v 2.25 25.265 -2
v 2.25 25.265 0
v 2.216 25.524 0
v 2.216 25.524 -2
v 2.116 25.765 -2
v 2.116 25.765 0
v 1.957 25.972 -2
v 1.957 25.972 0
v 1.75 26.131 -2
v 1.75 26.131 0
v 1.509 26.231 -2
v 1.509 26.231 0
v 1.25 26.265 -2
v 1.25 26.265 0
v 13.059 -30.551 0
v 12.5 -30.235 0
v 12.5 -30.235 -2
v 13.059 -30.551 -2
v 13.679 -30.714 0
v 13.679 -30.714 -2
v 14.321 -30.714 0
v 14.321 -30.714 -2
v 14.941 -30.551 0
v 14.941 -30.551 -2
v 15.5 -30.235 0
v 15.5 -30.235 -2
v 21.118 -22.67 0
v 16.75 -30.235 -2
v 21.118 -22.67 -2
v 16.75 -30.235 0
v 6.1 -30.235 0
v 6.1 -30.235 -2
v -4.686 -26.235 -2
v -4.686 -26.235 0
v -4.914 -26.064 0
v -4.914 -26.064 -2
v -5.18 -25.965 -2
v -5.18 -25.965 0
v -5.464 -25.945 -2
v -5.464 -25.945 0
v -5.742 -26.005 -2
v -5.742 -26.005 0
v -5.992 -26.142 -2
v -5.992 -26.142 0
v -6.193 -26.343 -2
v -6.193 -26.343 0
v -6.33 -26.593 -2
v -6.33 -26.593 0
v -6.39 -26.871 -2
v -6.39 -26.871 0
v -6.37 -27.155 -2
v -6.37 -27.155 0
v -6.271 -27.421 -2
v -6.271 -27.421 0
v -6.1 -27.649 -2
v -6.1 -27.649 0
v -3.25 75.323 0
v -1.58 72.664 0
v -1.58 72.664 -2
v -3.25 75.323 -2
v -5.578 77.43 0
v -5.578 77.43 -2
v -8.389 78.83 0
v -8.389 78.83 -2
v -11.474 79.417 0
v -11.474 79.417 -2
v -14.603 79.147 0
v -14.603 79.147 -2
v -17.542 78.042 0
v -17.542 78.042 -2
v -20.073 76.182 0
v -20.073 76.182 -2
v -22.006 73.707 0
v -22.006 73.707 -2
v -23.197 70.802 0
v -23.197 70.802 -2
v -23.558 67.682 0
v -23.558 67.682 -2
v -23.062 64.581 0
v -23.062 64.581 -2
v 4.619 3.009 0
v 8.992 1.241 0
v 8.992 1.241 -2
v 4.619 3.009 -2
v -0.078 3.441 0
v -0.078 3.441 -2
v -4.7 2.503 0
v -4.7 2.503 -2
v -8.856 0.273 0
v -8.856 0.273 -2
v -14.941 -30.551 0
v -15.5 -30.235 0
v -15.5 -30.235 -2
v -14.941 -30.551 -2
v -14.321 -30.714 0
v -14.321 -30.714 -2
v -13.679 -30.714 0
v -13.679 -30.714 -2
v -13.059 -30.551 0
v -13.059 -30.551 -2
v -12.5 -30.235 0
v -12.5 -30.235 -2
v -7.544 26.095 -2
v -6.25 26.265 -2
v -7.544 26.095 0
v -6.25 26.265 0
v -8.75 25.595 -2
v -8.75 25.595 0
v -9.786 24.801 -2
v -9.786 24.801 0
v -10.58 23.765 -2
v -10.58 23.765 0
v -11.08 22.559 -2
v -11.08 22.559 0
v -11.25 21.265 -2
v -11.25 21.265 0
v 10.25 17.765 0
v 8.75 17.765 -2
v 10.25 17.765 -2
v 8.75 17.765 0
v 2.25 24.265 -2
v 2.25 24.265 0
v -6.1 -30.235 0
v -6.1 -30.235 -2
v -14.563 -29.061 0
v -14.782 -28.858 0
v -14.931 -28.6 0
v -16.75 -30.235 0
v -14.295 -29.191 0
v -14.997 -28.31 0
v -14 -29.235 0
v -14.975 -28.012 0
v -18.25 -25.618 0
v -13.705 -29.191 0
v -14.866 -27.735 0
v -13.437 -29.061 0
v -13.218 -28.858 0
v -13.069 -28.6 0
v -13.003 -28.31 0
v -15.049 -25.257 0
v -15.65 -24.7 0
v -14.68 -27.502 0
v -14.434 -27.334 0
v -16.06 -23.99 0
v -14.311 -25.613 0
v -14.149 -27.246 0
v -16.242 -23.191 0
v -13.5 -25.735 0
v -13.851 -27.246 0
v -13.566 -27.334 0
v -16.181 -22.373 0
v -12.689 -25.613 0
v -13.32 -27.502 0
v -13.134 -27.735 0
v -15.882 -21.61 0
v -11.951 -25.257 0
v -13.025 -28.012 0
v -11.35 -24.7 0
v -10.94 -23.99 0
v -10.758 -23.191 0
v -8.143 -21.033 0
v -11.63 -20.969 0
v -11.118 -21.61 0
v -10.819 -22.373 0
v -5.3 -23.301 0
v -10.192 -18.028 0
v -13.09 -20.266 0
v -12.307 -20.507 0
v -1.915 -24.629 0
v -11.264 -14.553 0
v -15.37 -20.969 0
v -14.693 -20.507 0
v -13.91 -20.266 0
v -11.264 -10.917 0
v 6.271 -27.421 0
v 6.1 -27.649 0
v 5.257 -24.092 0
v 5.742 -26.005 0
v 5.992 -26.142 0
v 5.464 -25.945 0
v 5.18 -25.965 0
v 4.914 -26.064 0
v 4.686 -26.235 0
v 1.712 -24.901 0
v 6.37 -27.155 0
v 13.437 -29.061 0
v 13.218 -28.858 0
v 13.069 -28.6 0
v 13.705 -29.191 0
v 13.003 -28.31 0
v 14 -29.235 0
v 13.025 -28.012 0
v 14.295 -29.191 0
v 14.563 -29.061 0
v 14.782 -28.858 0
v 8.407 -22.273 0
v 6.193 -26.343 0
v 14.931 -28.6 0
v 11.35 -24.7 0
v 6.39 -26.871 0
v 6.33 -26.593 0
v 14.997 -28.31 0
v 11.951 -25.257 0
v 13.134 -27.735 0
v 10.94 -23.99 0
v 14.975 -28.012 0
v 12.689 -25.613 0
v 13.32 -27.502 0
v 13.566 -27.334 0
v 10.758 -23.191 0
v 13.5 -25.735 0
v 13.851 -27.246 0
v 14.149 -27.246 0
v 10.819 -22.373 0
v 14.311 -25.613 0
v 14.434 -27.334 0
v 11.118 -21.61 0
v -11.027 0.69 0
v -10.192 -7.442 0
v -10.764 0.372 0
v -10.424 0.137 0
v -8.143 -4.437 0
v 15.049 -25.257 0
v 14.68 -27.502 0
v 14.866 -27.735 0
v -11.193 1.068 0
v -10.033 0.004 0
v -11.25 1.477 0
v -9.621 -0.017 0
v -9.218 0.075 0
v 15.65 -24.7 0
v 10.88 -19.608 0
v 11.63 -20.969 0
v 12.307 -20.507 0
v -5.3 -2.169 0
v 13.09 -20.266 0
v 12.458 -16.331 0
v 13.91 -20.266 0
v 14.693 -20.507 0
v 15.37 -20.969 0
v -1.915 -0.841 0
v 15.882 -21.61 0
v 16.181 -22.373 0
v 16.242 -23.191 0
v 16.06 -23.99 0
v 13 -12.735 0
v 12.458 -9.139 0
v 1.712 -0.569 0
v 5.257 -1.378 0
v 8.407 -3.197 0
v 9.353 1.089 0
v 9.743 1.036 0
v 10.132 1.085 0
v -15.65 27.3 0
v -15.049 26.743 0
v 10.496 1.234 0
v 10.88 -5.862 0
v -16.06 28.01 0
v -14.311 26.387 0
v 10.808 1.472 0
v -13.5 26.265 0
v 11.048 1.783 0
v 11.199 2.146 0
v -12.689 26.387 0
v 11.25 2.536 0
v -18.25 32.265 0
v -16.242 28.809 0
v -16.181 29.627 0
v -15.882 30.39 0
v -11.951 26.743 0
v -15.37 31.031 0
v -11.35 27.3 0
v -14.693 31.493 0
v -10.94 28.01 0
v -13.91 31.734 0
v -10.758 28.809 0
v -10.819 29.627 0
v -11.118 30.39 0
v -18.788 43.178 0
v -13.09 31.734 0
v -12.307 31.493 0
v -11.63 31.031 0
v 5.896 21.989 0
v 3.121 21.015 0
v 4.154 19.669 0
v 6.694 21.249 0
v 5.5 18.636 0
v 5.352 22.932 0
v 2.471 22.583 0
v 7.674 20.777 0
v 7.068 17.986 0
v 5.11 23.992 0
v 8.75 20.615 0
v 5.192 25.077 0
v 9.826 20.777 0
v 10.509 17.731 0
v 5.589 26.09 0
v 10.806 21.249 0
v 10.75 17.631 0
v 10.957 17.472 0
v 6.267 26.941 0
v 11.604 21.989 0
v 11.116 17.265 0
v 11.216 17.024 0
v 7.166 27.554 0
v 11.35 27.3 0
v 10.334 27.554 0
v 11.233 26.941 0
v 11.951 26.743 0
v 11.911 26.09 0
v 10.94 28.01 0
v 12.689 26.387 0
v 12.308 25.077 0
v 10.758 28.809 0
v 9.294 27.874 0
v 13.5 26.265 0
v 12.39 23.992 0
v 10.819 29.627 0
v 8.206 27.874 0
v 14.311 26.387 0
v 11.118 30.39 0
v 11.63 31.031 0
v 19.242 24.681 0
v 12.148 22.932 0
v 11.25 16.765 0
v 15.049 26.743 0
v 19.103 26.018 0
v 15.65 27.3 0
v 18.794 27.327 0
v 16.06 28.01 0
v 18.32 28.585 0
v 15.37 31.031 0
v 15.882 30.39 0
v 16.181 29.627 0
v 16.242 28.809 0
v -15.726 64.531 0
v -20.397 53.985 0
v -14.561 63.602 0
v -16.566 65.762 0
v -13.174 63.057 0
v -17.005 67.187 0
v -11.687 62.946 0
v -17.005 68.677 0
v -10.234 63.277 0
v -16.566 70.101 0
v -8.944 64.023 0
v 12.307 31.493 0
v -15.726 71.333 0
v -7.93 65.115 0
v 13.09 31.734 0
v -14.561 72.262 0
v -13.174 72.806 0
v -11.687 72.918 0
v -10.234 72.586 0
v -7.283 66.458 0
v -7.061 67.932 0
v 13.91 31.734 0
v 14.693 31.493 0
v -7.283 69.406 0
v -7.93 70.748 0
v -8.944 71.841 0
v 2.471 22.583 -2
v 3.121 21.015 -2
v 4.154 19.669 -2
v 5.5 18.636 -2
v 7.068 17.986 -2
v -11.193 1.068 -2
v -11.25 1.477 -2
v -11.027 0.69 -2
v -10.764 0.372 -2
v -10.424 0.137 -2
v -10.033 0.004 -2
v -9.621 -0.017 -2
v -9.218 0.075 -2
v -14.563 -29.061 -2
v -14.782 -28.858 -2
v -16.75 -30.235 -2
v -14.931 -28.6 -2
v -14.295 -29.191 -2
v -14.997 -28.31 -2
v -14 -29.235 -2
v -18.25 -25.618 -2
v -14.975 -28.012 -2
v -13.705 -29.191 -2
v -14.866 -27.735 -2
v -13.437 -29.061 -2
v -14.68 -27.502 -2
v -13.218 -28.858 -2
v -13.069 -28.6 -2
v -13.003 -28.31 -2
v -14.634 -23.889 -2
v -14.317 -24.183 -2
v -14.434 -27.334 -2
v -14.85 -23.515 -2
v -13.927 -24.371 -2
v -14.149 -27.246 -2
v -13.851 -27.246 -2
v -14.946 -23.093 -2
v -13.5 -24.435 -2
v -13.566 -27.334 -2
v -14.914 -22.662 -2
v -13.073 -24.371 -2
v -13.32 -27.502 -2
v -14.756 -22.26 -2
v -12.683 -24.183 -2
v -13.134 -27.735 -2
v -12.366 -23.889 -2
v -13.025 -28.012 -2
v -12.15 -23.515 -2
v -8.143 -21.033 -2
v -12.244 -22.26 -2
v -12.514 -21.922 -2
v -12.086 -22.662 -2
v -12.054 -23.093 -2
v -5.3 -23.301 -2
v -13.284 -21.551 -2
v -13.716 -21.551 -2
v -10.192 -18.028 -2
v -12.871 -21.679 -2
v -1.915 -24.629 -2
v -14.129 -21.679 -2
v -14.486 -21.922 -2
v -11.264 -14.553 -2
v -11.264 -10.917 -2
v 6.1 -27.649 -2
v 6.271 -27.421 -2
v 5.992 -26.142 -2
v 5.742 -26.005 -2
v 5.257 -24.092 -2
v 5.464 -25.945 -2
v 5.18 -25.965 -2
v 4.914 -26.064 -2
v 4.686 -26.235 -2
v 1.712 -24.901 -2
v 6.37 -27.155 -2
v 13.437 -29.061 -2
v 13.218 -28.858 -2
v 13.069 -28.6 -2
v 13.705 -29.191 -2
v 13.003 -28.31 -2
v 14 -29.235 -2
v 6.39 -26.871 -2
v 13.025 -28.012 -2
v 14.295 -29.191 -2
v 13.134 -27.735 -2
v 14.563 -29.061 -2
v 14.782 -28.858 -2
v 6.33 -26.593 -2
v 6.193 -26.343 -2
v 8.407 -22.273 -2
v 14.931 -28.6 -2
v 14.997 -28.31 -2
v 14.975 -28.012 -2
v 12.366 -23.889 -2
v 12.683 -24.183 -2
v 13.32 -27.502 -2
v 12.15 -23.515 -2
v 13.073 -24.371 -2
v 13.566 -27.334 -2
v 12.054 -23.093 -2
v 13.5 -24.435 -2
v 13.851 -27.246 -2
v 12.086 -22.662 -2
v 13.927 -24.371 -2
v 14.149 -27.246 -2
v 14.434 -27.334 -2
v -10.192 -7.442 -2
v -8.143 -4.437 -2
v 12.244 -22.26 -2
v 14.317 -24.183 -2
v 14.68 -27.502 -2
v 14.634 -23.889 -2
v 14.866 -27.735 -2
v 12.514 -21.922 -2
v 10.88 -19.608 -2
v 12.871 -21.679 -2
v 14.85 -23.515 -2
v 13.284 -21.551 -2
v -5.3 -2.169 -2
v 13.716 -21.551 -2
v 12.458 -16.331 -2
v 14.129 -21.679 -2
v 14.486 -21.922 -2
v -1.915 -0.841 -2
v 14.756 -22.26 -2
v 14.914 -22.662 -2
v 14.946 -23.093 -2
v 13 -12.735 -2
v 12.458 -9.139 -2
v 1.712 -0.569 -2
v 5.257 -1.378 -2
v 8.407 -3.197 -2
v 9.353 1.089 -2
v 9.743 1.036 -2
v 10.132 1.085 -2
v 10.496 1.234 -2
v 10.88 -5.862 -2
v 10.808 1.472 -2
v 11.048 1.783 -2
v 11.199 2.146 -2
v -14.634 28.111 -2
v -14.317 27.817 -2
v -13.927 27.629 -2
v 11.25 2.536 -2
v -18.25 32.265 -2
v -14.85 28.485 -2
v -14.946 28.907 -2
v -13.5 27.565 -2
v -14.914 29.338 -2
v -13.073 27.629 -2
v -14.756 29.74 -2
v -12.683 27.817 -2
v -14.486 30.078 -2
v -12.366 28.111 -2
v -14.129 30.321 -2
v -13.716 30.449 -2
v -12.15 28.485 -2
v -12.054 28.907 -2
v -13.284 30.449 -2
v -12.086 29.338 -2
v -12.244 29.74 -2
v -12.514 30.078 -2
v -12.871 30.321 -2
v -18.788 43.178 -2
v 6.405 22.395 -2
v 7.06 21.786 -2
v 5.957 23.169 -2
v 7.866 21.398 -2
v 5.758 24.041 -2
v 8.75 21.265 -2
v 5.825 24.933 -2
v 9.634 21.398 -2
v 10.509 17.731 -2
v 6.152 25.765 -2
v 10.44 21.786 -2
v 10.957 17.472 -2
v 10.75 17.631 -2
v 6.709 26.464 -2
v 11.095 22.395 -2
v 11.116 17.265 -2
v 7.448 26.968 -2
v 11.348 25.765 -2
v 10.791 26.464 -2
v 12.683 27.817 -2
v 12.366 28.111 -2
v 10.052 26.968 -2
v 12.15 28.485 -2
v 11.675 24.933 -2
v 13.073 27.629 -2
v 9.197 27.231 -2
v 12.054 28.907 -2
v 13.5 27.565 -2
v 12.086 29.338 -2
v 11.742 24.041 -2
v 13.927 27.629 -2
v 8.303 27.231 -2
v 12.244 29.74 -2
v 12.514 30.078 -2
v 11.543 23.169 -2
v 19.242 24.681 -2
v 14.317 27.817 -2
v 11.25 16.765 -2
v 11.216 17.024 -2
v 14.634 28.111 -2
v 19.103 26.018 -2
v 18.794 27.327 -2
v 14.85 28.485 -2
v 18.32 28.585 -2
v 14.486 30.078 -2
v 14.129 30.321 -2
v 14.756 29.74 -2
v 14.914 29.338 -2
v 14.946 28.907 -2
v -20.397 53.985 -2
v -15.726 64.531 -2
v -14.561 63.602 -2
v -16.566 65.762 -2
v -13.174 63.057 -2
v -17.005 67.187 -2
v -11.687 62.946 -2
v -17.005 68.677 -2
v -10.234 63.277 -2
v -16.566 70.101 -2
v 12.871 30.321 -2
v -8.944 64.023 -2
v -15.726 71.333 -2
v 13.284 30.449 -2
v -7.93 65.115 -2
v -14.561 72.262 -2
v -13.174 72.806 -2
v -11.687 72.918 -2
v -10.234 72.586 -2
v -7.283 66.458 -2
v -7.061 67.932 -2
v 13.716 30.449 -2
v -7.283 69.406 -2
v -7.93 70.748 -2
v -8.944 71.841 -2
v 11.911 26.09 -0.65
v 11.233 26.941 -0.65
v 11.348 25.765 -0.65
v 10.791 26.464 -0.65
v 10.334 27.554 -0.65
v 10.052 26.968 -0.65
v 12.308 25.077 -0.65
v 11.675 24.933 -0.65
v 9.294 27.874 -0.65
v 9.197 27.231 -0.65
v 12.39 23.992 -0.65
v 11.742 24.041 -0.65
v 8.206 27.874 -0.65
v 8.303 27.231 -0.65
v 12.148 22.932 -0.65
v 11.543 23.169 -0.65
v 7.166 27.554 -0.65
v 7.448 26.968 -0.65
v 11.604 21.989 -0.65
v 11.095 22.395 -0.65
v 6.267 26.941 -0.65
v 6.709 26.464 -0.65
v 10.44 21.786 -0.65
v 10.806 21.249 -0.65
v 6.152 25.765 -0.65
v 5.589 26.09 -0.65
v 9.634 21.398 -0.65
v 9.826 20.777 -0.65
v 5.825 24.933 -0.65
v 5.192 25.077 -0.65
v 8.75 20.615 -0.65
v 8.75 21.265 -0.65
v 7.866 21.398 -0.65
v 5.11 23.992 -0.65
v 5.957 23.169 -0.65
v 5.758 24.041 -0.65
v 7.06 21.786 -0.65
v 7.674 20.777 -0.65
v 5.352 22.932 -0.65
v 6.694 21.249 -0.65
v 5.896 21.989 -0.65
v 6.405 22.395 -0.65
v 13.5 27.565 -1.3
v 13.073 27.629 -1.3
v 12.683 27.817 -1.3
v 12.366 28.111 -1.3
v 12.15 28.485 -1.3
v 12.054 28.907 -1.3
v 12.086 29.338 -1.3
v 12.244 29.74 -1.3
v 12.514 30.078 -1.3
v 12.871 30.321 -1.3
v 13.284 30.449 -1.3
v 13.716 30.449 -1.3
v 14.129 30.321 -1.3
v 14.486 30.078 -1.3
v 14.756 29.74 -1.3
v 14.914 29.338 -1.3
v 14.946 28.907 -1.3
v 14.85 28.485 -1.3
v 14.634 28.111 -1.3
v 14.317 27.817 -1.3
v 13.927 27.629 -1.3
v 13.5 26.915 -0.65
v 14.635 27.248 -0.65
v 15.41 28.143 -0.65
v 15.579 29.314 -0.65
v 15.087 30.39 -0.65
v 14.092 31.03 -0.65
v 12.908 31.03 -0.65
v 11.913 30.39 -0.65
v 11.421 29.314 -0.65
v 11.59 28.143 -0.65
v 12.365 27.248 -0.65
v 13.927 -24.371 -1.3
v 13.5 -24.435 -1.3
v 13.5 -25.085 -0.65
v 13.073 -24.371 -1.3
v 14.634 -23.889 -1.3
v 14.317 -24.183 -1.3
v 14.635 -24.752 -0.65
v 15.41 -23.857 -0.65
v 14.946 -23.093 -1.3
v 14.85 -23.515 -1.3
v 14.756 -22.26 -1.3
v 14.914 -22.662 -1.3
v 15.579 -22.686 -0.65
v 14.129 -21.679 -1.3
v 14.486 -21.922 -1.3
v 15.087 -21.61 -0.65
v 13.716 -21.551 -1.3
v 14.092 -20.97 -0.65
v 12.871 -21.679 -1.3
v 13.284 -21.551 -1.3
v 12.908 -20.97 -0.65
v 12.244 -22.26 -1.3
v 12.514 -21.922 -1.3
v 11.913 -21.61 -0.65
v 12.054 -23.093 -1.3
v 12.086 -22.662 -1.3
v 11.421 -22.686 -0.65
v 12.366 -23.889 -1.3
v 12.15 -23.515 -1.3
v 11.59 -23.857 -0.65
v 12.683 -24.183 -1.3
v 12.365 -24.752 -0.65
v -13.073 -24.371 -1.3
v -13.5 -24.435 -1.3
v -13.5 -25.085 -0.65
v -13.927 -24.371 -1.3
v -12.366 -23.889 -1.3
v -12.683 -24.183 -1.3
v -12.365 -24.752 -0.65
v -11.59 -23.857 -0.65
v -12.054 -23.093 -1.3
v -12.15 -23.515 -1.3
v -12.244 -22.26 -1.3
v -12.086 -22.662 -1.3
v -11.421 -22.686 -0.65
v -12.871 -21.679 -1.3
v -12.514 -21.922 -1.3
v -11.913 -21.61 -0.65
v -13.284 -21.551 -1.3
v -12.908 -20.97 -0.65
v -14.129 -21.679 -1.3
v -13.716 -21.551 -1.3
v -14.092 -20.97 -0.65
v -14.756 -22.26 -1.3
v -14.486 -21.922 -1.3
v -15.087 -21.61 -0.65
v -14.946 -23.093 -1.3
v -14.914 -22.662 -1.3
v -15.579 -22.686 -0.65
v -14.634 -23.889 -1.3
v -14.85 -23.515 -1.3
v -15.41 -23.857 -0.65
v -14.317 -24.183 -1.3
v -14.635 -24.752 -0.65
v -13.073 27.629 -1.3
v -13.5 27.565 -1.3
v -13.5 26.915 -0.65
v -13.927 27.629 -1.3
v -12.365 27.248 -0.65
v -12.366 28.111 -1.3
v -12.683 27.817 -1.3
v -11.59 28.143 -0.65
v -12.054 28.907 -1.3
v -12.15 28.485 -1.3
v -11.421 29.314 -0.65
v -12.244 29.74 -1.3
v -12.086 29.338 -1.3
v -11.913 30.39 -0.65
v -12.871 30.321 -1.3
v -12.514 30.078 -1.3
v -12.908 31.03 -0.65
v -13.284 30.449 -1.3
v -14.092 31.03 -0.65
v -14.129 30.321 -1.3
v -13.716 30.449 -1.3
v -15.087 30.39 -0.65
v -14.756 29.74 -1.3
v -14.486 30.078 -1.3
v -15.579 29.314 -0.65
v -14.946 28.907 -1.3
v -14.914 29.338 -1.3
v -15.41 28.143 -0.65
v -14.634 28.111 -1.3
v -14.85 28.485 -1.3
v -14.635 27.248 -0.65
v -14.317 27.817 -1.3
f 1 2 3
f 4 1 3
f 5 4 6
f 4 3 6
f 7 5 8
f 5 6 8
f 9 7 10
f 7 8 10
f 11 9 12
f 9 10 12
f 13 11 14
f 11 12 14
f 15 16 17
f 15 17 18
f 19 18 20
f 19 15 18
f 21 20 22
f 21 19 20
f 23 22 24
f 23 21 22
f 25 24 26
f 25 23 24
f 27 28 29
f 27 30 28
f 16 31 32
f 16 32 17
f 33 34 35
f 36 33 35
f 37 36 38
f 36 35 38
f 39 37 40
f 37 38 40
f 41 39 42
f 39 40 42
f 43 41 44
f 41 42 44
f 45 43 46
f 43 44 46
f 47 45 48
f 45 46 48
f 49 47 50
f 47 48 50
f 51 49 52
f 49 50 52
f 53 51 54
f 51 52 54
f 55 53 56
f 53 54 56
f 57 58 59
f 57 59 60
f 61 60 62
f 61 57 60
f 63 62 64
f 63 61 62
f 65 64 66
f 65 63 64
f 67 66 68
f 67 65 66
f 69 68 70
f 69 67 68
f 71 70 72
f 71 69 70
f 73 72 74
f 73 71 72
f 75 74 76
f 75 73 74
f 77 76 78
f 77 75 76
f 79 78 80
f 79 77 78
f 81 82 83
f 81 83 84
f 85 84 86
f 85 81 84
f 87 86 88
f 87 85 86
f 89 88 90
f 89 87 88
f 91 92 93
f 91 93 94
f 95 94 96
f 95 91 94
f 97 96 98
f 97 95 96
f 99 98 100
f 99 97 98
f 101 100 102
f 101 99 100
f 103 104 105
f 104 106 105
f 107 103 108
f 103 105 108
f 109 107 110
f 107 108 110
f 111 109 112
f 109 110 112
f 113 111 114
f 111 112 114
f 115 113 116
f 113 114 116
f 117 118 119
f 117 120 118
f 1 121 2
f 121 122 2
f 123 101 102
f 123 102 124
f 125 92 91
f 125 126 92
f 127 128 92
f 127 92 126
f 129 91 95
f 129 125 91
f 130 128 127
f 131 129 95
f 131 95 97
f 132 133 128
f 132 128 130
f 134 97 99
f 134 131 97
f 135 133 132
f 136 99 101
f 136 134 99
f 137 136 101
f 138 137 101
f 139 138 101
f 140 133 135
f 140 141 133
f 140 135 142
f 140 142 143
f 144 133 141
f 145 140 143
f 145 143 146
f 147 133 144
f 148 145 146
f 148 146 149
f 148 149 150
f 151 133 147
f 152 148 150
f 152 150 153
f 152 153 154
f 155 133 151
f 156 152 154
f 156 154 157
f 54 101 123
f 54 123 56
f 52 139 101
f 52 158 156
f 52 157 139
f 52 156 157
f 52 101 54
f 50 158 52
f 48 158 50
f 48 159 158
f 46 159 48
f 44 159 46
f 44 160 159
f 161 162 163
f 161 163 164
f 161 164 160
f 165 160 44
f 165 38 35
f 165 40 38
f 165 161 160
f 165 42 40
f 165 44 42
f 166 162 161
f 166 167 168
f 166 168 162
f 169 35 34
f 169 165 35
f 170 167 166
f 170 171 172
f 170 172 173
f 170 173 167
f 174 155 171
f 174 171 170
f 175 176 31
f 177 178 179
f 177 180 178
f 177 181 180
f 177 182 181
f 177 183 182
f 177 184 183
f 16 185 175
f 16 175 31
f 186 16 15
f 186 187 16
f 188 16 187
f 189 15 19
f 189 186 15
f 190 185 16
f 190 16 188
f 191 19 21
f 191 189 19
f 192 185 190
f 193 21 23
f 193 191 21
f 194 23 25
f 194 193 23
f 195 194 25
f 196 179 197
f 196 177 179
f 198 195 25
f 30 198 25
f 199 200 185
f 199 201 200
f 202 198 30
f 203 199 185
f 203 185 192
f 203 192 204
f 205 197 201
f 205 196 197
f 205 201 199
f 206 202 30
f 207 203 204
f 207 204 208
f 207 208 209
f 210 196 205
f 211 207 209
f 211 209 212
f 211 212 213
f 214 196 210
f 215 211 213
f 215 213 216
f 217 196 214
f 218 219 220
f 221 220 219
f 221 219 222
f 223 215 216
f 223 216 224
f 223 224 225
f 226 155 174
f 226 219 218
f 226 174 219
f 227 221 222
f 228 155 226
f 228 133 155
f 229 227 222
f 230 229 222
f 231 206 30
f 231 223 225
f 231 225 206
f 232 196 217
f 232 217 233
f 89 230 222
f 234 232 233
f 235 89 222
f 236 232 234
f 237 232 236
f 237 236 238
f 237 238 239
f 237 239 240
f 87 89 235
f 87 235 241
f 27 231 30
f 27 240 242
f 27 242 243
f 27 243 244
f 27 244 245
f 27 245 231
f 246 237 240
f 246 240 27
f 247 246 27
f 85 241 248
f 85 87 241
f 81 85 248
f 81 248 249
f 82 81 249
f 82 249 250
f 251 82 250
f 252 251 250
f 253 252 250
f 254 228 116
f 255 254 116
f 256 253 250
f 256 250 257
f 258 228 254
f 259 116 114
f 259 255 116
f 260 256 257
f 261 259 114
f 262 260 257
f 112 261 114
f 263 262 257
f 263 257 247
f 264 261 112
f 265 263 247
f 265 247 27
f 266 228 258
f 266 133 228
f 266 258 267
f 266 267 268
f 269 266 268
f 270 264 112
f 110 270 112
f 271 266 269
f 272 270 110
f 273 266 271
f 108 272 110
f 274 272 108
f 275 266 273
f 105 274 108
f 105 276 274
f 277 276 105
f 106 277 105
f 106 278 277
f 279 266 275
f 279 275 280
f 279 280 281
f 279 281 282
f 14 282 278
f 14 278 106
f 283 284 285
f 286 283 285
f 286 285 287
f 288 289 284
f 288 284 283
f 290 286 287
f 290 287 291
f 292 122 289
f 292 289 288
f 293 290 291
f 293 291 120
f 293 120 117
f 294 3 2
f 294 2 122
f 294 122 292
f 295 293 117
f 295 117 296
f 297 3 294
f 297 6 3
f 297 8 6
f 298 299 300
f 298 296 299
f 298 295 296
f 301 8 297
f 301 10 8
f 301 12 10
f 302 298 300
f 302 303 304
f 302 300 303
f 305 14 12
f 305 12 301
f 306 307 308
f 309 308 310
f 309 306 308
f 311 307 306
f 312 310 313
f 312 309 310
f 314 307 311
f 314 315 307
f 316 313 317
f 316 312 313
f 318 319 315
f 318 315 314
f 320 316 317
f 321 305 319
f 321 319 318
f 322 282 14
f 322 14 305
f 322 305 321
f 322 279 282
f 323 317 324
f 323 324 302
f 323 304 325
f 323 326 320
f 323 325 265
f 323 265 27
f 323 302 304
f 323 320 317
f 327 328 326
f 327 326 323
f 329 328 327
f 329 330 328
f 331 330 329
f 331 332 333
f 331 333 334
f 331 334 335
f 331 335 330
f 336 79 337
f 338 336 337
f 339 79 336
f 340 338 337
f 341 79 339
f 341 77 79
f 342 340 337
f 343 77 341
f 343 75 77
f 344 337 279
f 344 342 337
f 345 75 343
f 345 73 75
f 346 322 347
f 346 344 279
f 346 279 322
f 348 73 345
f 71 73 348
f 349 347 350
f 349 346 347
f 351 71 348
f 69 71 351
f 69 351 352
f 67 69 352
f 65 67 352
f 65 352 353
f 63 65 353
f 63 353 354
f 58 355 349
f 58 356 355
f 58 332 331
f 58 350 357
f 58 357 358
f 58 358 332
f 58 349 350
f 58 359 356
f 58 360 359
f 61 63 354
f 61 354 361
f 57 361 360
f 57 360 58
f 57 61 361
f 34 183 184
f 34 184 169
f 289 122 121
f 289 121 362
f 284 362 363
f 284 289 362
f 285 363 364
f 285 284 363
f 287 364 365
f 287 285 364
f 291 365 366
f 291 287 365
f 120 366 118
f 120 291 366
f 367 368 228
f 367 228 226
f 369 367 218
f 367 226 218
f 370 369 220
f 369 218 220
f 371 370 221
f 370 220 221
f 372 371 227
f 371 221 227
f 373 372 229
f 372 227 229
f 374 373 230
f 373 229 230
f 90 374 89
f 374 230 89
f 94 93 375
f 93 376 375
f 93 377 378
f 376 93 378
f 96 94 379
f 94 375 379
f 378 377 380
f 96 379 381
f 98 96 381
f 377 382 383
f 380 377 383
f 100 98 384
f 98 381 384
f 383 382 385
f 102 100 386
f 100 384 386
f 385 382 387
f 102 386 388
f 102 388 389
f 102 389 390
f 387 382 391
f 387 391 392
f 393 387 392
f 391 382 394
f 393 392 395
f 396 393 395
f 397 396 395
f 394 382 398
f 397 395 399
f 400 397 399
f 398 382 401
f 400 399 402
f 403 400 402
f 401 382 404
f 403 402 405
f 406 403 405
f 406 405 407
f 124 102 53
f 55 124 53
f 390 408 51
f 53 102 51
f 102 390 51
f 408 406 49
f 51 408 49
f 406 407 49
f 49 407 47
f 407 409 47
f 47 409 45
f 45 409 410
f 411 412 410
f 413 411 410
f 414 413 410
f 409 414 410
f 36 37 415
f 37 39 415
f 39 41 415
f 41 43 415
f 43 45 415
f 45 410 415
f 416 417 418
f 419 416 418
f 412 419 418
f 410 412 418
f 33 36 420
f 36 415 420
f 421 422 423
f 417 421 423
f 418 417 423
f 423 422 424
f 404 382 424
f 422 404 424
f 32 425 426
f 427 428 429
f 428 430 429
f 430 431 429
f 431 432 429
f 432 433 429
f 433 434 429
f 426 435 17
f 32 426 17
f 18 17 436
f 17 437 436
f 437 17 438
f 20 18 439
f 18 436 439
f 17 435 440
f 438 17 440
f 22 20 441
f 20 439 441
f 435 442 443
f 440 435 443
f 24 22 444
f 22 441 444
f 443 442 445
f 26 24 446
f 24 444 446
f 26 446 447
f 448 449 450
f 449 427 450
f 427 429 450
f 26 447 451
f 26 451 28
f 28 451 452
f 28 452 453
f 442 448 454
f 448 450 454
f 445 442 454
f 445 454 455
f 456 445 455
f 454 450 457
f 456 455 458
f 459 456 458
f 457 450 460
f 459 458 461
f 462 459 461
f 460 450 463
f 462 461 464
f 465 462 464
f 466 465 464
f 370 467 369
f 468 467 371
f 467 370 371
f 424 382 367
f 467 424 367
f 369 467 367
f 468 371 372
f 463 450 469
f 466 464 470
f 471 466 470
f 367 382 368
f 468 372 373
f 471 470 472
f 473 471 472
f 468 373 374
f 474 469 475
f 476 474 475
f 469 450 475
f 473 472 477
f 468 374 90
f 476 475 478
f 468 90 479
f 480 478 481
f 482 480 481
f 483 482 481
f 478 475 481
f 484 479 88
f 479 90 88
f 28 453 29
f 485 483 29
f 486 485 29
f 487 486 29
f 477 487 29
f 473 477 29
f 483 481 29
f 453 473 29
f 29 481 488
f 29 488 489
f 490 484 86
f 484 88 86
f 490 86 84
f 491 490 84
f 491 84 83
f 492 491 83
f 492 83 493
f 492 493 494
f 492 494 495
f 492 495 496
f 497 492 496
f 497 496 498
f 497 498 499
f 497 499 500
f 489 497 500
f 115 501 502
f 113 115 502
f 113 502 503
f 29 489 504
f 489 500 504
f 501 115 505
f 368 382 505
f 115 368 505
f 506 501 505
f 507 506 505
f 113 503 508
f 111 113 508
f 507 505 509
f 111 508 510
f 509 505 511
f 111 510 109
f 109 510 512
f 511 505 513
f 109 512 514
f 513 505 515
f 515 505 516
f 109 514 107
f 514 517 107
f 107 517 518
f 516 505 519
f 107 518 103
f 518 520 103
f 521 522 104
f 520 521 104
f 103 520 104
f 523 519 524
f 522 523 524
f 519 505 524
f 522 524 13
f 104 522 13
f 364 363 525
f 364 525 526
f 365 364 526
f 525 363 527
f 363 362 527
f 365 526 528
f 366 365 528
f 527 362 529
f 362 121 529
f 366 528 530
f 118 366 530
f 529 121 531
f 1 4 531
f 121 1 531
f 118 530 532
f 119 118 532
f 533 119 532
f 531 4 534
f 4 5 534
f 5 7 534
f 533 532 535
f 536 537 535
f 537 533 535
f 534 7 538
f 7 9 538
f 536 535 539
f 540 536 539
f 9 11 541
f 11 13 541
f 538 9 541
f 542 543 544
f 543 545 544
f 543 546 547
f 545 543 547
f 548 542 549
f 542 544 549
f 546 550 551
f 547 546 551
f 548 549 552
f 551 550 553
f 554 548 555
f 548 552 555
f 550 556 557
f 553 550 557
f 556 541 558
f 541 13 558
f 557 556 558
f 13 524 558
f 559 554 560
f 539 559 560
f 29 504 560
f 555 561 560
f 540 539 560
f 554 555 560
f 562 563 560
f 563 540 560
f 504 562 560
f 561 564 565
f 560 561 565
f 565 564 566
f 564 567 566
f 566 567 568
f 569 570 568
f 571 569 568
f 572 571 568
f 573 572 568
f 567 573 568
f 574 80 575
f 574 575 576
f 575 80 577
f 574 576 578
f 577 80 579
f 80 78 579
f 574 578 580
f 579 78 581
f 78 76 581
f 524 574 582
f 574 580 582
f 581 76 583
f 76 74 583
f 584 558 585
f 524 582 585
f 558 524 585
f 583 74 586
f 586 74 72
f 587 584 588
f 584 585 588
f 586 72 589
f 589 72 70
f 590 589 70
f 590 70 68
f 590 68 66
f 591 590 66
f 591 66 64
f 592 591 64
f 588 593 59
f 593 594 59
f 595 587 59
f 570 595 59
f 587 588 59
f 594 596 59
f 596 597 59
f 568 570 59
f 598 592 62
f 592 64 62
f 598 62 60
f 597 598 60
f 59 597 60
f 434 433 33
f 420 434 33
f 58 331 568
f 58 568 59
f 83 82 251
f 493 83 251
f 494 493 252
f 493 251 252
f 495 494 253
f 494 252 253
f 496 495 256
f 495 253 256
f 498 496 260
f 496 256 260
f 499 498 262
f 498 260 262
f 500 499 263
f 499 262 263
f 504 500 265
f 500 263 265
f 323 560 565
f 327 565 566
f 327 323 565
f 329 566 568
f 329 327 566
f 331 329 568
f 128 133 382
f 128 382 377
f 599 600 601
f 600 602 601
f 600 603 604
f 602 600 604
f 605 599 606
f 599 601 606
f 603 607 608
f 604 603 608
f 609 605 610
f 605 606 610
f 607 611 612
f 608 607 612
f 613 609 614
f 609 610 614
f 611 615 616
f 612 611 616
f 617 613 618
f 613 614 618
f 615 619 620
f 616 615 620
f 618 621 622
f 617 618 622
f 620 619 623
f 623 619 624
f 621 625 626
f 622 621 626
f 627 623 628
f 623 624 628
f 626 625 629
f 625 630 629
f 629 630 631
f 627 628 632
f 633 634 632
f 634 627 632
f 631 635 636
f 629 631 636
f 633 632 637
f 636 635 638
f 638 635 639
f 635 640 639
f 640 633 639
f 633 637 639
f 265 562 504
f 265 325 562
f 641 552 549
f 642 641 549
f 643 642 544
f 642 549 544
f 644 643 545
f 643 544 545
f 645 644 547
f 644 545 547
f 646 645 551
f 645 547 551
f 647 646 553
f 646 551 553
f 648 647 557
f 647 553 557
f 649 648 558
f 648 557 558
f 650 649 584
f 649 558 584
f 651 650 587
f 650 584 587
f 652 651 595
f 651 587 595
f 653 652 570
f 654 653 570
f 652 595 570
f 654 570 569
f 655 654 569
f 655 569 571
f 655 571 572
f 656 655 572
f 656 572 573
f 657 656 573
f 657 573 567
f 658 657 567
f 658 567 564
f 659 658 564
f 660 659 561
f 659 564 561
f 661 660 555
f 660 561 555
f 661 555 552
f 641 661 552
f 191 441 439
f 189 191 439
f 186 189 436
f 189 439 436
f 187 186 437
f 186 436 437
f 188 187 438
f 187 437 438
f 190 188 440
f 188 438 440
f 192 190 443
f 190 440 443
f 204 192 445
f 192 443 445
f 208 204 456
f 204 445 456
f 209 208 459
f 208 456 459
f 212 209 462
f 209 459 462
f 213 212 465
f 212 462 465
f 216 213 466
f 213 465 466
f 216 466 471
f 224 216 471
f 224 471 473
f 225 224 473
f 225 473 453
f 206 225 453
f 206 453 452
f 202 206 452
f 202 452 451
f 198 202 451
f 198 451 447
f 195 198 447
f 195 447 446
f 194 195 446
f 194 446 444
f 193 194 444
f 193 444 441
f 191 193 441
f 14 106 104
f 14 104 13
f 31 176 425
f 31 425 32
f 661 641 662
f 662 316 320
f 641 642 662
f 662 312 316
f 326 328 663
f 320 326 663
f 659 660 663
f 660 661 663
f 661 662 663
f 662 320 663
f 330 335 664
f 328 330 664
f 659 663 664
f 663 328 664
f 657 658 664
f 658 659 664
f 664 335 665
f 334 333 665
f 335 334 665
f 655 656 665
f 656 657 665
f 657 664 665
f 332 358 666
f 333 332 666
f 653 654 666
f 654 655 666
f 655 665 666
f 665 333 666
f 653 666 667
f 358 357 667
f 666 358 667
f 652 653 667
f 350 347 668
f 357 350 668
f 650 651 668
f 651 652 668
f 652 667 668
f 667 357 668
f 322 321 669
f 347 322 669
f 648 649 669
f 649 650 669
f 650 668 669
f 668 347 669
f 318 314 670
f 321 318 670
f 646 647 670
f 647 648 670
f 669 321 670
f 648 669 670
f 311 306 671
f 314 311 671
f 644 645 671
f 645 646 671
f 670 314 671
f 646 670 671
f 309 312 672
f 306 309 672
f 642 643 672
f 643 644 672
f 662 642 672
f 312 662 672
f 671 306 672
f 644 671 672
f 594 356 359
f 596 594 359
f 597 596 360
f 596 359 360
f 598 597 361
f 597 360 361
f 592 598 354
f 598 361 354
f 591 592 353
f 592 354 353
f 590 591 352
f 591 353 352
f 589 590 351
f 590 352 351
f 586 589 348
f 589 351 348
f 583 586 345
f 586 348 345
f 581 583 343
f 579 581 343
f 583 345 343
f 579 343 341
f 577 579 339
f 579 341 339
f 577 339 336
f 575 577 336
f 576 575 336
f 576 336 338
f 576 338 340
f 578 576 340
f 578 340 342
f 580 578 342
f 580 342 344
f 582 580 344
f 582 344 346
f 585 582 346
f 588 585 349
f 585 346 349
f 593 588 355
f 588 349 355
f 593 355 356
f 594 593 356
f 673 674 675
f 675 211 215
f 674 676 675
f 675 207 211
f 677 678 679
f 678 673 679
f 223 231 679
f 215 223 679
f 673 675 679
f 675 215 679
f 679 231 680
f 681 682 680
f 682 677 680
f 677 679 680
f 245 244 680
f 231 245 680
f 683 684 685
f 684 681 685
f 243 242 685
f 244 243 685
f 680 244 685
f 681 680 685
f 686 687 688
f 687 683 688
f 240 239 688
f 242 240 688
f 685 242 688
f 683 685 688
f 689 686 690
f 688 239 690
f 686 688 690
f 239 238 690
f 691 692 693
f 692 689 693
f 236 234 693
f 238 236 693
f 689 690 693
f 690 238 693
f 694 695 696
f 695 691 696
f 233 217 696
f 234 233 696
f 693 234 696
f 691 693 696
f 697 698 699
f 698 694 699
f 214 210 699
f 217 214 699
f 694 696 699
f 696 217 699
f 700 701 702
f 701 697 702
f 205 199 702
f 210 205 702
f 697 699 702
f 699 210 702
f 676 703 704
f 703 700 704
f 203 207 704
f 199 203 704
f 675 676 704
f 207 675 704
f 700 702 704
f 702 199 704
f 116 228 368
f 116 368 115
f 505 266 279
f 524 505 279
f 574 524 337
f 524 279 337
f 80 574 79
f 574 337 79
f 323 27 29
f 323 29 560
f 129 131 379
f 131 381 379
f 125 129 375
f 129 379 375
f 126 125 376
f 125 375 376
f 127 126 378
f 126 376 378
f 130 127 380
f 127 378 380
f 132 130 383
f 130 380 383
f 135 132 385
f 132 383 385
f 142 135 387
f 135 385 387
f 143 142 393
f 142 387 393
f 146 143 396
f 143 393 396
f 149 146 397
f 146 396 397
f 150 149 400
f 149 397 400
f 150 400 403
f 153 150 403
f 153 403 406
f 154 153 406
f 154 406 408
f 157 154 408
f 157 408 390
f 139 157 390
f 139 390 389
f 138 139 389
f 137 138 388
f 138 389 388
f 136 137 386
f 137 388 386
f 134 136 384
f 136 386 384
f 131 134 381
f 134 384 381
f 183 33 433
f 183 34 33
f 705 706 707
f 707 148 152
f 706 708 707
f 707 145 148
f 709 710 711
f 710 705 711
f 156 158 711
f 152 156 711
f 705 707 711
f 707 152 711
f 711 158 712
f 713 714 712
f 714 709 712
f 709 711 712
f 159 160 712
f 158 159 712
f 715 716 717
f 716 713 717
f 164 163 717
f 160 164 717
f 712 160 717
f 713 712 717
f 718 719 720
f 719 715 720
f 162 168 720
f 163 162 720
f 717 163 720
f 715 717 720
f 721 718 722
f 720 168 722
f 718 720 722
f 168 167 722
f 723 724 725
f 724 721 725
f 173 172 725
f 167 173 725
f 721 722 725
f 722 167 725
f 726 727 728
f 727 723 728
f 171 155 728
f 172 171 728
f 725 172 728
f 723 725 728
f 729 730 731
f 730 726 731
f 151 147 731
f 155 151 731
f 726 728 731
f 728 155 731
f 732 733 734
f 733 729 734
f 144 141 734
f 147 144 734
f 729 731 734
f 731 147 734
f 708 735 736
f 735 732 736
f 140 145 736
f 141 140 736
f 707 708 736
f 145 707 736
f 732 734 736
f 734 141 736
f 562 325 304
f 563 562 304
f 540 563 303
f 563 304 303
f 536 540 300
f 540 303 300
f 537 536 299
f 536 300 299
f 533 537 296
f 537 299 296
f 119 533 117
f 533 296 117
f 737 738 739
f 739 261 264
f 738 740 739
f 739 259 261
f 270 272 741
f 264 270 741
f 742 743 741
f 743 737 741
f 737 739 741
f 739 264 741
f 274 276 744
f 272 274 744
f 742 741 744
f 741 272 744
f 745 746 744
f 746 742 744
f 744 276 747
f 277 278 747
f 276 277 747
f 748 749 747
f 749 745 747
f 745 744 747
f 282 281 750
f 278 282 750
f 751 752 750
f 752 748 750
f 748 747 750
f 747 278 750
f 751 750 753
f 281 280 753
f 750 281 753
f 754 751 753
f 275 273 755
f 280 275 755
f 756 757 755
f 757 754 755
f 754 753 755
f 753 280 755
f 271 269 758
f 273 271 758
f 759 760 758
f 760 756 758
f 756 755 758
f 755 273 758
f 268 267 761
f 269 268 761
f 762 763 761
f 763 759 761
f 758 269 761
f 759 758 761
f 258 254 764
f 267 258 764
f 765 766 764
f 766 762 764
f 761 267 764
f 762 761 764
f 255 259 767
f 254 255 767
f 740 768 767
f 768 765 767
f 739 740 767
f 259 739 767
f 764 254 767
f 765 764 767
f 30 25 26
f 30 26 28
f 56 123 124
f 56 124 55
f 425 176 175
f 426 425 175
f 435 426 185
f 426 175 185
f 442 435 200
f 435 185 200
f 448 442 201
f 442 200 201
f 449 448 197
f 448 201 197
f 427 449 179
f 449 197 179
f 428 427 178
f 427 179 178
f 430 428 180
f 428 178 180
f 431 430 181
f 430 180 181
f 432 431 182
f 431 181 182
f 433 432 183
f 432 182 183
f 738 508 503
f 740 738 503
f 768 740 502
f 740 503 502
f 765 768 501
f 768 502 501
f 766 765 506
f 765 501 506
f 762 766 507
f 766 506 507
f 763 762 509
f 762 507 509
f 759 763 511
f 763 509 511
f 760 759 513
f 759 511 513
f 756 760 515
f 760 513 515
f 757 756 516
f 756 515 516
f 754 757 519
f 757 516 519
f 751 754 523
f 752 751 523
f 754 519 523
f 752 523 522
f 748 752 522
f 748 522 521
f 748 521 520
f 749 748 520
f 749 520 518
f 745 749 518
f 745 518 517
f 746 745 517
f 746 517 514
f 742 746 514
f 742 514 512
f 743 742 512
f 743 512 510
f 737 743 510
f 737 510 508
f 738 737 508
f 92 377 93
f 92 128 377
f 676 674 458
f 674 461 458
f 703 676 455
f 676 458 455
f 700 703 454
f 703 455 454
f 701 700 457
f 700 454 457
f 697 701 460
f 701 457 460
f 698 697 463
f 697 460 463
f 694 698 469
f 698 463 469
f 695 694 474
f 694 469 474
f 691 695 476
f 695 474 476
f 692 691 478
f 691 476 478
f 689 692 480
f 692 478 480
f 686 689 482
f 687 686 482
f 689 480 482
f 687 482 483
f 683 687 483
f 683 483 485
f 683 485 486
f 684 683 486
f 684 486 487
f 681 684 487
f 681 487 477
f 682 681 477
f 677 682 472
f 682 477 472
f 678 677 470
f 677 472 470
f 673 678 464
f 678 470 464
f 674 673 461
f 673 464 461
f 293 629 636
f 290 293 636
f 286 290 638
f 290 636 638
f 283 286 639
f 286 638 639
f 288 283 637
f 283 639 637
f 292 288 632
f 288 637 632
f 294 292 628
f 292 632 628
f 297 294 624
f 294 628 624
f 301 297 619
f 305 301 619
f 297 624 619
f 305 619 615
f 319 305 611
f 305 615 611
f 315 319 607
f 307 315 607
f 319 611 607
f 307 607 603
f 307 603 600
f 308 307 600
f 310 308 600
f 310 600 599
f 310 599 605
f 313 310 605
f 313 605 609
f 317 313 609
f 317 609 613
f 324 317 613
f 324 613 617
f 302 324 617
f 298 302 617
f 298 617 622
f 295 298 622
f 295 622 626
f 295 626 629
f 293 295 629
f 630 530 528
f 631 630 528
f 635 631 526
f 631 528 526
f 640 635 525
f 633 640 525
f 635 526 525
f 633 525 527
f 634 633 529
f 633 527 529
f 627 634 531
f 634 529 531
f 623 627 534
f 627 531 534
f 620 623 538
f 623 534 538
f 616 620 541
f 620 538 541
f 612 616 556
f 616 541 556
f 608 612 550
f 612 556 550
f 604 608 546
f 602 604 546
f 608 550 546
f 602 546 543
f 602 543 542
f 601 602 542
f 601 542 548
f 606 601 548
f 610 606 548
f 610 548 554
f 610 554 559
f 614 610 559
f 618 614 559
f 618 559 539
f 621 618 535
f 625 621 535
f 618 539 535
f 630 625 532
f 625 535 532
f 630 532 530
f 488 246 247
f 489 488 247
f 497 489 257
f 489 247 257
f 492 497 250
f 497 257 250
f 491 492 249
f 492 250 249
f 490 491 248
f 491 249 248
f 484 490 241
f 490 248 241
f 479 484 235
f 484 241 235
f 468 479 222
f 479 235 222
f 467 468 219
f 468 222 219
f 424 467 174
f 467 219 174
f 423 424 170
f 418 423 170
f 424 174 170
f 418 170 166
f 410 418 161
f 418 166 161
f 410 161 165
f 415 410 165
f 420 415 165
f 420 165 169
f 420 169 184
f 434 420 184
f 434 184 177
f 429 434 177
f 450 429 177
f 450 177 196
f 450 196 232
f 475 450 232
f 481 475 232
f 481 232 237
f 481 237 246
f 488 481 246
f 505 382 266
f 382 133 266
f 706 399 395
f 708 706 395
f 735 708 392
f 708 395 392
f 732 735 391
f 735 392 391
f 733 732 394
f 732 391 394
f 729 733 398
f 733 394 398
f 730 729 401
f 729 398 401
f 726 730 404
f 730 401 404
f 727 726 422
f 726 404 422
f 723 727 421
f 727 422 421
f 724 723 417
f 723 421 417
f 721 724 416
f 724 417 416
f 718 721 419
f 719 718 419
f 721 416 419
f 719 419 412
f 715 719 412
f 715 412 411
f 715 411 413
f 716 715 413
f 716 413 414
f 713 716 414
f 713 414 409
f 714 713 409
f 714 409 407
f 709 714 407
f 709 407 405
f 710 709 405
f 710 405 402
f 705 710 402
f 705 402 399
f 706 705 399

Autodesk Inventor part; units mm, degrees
ref_plane "YZ Plane" through (0, 0, 0) normal (1, 0, 0) x (0, 1, 0)
ref_plane "XZ Plane" through (0, 0, 0) normal (0, 1, 0) x (-1, 0, 0)
ref_plane "XY Plane" through (0, 0, 0) normal (0, 0, 1) x (1, 0, 0)
sketch "スケッチ1" plane through (0, 0, 0) normal (0, 0, 1) x (1, 0, 0)
  circle A0 centre (13.5, 29.015) radius 1.3 construction
  circle A1 centre (-13.5, 29.015) radius 1.3 construction
  circle A2 centre (-13.5, -22.985) radius 1.3 construction
  circle A3 centre (13.5, -22.985) radius 1.3 construction
  line L0 (13.5, 29.015) -> (-13.5, 29.015) construction
  line L1 (-13.5, 29.015) -> (-13.5, -22.985) construction
  line L2 (-13.5, -22.985) -> (13.5, -22.985) construction
  line L3 (13.5, -22.985) -> (13.5, 29.015) construction
  line L4 (21.1178, -22.6697) -> (19.2418, 24.6807)
  arc A4 (19.2418, 24.6807) -> (18.3199, 28.5854) centre (8.75, 24.265) ccw
  line L5 (0, 0) -> (0, -35.9566) construction
  circle A5 centre (-12.061, 67.9318) radius 5
  line L6 (-16.75, -30.235) -> (-15.5, -30.235) projected
  arc A6 (-15.5, -30.235) -> (-12.5, -30.235) centre (-14, -28.235) ccw projected
  line L7 (-12.5, -30.235) -> (-6.1, -30.235) projected
  line L8 (-6.1, -30.235) -> (-6.1, -27.6492) projected
  arc A7 (-4.6858, -26.235) -> (-6.1, -27.6492) centre (-5.3929, -26.9421) ccw projected
  line L9 (-4.6858, -26.235) -> (4.6858, -26.235) projected
  arc A8 (6.1, -27.6492) -> (4.6858, -26.235) centre (5.3929, -26.9421) ccw projected
  line L10 (6.1, -27.6492) -> (6.1, -30.235) projected
  line L11 (6.1, -30.235) -> (12.5, -30.235) projected
  arc A9 (12.5, -30.235) -> (15.5, -30.235) centre (14, -28.235) ccw projected
  line L12 (15.5, -30.235) -> (16.75, -30.235) projected
  arc A10 (-11.25, -10.8278) -> (11.25, -6.4392) centre (0.8, -12.735) ccw construction
  circle A11 centre (0.8, -12.735) radius 12.2
  circle A12 centre (-12.061, 67.9318) radius 5 construction
  circle A13 centre (8.75, 24.265) radius 3 construction
  line L13 (-11.25, 1.4772) -> (-11.25, 21.265)
  arc A14 (-6.25, 26.265) -> (-11.25, 21.265) centre (-6.25, 21.265) ccw
  line L14 (-6.25, 26.265) -> (1.25, 26.265)
  line L15 (11.25, 16.765) -> (11.25, 2.5355)
  arc A15 (2.25, 24.265) -> (8.75, 17.765) centre (8.75, 24.265) ccw
  line L16 (8.75, 17.765) -> (10.25, 17.765)
  line L17 (2.25, 24.265) -> (2.25, 25.265)
  arc A16 (11.25, 16.765) -> (10.25, 17.765) centre (10.25, 16.765) ccw
  arc A17 (2.25, 25.265) -> (1.25, 26.265) centre (1.25, 25.265) ccw
  arc A18 (8.9915, 1.2414) -> (-8.8559, 0.2728) centre (0.8, -12.735) ccw
  arc A19 (8.9915, 1.2414) -> (11.25, 2.5355) centre (9.75, 2.5355) ccw
  arc A20 (-11.25, 1.4772) -> (-8.8559, 0.2728) centre (-9.75, 1.4772) ccw
  line L18 (18.3199, 28.5854) -> (-1.5796, 72.6637)
  arc A21 (-1.5796, 72.6637) -> (-23.0621, 64.5812) centre (-12.061, 67.9318) ccw
  line L19 (-18.25, -25.6185) -> (-16.75, -30.235)
  line L20 (16.75, -30.235) -> (21.1178, -22.6697)
  line L21 (16.0414, 27.5568) -> (-3.8582, 71.635) construction
  arc A22 (16.7437, 24.5817) -> (16.0414, 27.5568) centre (8.75, 24.265) ccw construction
  line L22 (18.7764, -26.7219) -> (16.7437, 24.5817) construction
  arc A23 (-15.75, 32.265) -> (-20.6705, 65.3096) centre (-129.1686, 32.265) ccw construction
  line L23 (-15.75, 32.265) -> (-15.75, -31.3287) construction
  line L24 (-18.25, -25.6185) -> (-18.25, 32.265)
  arc A24 (-18.25, 32.265) -> (-23.0621, 64.5812) centre (-129.1686, 32.265) ccw
  point P0 (0, -56.485)
  point P1 (11.25, -0.3561)
  point P2 (-11.25, -1.9074)
  dimension "d3" = 10
  dimension "d22" = 3.5
  dimension "d23" = 1
  dimension "d24" = 1.5
  dimension "d25" = 4
  dimension "d35" = 11.5
  dimension "d37" = 18
  dimension "d38" = 30
extrude "押し出し1" add sketch "スケッチ1" against normal blind 2
hole "穴1" at (-13.5, 29.015, 0) at (-13.5, -22.985, 0) at (13.5, -22.985, 0) at (13.5, 29.015, 0) direction (0, 0, -1) diameter 2.9 end through all countersink diameter 5.5 countersink angle 90 clearance for "Countersunk Flat Head Screw ISO 2009/7046" size "M2.5" standard "ISO"
hole "穴2" at (14, -28.235, 0) at (-14, -28.235, 0) direction (0, 0, -1) diameter 2 end through all
hole "穴3" at (8.75, 24.265, 0) direction (0, 0, -1) diameter 6 end through all counterbore diameter 7.3 counterbore depth 0.65
properties part number "UPPER_LEG_MIDDLE_FRAME"
